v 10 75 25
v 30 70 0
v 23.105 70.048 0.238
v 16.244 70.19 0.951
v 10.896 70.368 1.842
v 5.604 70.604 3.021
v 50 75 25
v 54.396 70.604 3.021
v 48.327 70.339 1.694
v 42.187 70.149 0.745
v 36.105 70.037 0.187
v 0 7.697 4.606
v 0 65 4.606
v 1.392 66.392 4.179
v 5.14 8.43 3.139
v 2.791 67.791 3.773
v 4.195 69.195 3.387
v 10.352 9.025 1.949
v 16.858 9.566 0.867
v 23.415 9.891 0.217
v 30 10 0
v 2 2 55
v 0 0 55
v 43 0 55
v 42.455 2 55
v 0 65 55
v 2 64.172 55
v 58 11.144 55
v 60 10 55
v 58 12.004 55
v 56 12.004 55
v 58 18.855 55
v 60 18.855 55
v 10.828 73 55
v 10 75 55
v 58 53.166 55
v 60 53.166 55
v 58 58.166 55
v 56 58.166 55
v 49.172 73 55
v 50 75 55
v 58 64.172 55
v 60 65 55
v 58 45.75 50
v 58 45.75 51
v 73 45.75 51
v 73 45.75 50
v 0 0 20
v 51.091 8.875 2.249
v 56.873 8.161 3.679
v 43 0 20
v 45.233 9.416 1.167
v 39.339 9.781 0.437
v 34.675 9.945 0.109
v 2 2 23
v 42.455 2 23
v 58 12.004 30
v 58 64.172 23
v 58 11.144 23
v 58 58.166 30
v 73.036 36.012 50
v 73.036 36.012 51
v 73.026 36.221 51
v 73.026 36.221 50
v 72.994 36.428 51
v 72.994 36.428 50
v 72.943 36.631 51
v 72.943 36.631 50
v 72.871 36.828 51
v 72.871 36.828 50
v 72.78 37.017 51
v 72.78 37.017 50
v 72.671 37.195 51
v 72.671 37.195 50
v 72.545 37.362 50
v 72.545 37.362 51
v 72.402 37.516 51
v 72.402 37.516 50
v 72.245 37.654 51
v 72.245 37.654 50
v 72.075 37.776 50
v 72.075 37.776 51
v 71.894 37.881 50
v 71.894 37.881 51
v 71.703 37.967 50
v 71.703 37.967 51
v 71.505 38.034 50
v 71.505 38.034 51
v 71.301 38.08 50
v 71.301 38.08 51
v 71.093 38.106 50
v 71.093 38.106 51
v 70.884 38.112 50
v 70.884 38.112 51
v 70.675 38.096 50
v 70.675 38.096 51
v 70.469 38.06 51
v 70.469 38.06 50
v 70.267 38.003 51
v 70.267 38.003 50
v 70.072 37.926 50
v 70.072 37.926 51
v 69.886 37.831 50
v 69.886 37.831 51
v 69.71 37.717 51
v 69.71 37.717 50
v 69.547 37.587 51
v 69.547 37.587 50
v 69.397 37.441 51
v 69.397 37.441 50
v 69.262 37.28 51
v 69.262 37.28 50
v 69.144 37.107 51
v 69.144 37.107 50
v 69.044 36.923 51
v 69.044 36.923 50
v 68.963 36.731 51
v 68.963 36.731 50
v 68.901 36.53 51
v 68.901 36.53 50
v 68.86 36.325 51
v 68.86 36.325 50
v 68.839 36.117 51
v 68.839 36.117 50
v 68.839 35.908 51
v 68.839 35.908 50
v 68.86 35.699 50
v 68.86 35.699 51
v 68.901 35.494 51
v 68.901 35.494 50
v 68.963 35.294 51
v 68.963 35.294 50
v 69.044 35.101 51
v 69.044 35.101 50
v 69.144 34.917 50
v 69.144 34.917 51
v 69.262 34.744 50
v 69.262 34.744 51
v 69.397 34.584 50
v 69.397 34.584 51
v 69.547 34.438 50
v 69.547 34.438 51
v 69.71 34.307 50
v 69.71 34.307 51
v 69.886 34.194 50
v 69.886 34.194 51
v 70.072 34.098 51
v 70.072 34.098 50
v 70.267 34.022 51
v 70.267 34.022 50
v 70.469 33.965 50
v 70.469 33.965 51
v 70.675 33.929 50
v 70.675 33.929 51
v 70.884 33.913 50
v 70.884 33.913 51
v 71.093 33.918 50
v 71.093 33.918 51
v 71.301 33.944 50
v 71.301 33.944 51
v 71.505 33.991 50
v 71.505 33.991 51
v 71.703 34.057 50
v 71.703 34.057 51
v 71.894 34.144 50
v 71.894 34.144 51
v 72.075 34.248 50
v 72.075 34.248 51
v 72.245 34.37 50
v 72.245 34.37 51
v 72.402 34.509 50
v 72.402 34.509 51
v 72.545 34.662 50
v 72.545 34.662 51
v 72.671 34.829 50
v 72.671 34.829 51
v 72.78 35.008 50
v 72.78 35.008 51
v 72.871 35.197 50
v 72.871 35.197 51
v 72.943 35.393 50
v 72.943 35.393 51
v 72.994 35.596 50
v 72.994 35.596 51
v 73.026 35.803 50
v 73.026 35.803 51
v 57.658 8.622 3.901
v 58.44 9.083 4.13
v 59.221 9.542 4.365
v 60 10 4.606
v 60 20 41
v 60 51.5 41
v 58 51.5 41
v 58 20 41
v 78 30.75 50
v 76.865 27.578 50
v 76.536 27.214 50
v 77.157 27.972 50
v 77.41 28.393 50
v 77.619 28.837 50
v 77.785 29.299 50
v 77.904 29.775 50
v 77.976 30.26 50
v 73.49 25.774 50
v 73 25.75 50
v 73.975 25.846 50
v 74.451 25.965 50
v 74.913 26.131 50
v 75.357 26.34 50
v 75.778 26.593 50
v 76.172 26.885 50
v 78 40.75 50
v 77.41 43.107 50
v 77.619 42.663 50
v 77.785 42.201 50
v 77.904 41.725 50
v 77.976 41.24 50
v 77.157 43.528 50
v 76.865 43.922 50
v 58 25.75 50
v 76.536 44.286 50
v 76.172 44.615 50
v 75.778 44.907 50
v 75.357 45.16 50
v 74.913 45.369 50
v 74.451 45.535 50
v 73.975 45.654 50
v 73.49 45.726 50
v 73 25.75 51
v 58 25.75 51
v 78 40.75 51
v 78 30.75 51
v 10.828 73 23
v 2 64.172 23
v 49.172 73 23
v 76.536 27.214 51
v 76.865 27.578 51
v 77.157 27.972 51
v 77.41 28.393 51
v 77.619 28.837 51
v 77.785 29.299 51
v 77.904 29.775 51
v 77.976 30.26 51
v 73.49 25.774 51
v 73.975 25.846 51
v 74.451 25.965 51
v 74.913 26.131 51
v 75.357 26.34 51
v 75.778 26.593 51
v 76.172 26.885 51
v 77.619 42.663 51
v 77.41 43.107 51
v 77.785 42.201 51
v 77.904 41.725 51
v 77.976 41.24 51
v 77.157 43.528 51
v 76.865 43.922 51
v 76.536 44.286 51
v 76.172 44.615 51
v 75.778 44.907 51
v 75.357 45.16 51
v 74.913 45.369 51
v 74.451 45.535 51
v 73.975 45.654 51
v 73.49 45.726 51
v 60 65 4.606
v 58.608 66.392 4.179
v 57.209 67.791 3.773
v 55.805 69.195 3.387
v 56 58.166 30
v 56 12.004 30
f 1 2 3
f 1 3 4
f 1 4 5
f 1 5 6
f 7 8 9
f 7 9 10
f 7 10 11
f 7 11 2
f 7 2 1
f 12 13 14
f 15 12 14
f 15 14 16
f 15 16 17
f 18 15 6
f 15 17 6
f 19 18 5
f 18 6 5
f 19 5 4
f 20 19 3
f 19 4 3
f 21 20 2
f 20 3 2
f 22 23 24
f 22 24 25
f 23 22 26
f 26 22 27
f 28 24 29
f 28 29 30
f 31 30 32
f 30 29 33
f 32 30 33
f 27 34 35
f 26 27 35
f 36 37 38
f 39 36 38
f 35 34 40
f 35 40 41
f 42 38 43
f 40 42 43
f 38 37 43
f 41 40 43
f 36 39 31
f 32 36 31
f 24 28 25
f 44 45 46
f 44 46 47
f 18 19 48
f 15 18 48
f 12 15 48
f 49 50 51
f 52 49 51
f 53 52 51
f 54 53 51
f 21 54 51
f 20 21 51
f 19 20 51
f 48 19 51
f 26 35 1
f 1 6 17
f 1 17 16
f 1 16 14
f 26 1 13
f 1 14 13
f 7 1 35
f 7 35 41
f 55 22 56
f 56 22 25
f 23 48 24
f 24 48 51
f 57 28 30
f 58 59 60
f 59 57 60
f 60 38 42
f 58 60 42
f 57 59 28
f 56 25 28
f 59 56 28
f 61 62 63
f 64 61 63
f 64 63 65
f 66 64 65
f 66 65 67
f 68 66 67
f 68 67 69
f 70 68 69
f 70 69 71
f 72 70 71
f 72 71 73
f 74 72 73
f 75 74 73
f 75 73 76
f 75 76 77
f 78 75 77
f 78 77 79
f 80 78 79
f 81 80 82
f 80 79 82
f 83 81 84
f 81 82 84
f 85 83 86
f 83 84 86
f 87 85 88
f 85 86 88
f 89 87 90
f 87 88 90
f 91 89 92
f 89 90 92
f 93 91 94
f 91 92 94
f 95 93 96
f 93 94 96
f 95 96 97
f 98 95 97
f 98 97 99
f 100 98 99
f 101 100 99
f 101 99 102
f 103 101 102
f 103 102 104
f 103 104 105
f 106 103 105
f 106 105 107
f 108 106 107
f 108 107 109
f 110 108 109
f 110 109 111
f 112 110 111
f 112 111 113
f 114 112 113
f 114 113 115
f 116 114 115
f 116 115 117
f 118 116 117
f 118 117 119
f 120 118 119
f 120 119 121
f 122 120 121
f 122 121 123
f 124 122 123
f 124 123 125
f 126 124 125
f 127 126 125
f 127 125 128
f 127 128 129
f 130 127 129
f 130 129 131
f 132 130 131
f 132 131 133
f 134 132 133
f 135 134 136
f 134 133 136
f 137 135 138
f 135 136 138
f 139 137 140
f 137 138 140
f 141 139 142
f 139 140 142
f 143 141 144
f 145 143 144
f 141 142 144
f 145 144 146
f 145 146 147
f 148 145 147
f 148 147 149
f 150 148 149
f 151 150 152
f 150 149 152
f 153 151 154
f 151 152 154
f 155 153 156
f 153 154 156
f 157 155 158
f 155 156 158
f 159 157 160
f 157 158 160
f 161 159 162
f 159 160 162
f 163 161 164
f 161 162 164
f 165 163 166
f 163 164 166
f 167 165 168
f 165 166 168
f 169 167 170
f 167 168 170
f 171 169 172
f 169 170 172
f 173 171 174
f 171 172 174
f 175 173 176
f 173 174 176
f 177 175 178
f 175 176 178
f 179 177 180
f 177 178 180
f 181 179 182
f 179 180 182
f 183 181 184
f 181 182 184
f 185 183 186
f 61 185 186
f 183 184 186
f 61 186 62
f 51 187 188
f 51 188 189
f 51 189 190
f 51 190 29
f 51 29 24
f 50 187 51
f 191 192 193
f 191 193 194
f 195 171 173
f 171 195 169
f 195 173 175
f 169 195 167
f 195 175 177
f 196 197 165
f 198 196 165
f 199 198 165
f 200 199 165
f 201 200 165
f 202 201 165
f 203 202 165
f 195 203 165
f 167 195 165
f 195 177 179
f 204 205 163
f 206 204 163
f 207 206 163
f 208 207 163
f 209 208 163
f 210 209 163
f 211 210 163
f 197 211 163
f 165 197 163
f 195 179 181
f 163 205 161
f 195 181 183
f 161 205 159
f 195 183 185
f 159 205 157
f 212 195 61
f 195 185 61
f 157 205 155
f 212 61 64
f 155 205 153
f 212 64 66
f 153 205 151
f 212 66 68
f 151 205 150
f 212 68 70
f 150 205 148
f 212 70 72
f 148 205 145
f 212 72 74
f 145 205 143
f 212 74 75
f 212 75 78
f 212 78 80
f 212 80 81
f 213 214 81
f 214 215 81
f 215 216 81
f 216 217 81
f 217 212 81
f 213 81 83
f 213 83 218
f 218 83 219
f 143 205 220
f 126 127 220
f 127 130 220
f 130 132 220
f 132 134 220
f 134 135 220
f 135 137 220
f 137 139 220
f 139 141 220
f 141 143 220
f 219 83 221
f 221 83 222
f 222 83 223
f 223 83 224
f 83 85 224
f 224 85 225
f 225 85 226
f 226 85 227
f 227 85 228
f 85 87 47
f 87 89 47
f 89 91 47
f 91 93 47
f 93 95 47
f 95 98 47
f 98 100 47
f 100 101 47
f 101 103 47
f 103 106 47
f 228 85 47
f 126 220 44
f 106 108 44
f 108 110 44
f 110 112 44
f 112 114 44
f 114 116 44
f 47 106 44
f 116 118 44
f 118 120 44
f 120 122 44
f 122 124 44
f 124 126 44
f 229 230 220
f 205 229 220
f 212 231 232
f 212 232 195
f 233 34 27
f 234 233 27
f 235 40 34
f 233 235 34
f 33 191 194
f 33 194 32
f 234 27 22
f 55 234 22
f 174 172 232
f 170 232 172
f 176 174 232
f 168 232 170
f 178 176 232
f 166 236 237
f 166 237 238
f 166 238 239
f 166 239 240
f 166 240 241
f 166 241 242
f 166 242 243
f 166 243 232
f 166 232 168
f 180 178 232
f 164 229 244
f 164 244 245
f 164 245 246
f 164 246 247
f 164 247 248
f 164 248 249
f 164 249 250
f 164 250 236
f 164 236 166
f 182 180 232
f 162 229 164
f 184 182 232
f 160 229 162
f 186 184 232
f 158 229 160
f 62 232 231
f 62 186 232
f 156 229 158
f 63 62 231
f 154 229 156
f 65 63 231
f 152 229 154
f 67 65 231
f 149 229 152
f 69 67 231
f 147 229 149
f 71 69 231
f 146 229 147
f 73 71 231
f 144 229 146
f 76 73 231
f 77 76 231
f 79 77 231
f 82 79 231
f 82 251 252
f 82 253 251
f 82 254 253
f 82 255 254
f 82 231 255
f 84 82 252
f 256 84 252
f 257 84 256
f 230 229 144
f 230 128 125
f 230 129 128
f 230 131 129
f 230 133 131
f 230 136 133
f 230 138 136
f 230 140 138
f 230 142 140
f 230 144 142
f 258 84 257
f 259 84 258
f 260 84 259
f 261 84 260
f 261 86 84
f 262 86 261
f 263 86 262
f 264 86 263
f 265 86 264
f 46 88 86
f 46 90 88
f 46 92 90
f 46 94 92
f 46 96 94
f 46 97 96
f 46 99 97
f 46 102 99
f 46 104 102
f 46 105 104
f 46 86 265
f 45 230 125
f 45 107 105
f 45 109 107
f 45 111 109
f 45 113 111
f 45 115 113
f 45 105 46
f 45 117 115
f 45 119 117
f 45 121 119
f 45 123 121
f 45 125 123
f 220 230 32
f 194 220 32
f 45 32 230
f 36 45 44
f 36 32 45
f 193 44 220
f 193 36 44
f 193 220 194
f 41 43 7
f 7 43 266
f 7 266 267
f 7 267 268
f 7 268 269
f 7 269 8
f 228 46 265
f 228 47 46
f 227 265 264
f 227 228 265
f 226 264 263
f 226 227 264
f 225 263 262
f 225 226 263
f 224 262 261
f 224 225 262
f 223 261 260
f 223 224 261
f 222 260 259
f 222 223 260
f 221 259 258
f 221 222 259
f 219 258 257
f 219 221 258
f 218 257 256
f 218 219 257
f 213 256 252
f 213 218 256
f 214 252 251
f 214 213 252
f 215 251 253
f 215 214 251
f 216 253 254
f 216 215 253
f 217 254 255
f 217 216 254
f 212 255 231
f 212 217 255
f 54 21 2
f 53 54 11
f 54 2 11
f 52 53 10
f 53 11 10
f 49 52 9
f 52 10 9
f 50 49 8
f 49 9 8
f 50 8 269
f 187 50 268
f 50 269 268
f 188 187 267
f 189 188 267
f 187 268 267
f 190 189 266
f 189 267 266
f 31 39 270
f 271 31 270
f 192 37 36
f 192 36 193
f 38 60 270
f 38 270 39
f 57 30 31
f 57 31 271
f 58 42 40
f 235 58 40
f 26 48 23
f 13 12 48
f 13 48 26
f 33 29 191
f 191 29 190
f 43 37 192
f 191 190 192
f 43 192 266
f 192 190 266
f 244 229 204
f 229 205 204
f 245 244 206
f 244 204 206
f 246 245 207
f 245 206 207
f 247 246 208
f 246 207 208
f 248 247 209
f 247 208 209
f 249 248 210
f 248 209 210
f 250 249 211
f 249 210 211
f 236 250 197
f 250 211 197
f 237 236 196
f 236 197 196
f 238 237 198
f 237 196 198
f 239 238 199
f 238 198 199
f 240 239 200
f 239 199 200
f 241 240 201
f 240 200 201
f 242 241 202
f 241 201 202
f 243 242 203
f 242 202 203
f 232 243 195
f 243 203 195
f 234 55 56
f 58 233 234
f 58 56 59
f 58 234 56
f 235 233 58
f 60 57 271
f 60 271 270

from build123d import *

# Parameters (mm, degrees)
SKETCH_1_W            = 60
SKETCH_1_H            = 75
EXTRUDE_1_DEPTH       = 55
CUT_EXTRUDE_2_DEPTH   = 63
CUT_EXTRUDE_3_DEPTH   = 63
CUT_EXTRUDE_4_DEPTH   = 63
CUT_EXTRUDE_5_DEPTH   = 73
CUT_EXTRUDE_6_DEPTH   = 32
CUT_EXTRUDE_7_DEPTH   = 32
EXTRUDE_2_DEPTH       = 2
SKETCH_10_W           = 1
SKETCH_10_H           = 20
EXTRUDE_3_DEPTH       = 20
FILLET_1_R            = 5
HOLE_WIZARD_M51_D     = 4.2
HOLE_WIZARD_M51_DEPTH = 38.5
HOLE_WIZARD_M51_TIP   = 1.2618073


with BuildPart() as part:
    # Эскиз1 → Бобышка-Вытянуть1 (new body)
    with BuildSketch(Plane.XY):
        with Locations((30, 37.5)):
            Rectangle(SKETCH_1_W, SKETCH_1_H)
    extrude(amount=EXTRUDE_1_DEPTH)

    # Эскиз3 → Вырез-Вытянуть2 (cut)
    with BuildSketch(Plane(origin=(60, 0, 0), x_dir=(0, 0, -1), z_dir=(1, 0, 0))):
        Polygon((0, 0), (0, 10), (-20, 0), align=None)
        Polygon((0, 75), (0, 70), (-25, 75), align=None)
    extrude(amount=-CUT_EXTRUDE_2_DEPTH, mode=Mode.SUBTRACT)

    # Эскиз4 → Вырез-Вытянуть3 (cut)
    with BuildSketch(Plane(origin=(0, 0, 0), x_dir=(-1, 0, 0), z_dir=(0, 0, -1))):
        Polygon((-60, 0), (-60, 10), (-43, 0), align=None)
    extrude(amount=-CUT_EXTRUDE_3_DEPTH, mode=Mode.SUBTRACT)

    # Эскиз5 → Вырез-Вытянуть4 (cut)
    with BuildSketch(Plane(origin=(0, 0, 0), x_dir=(-1, 0, 0), z_dir=(0, 0, -1))):
        Polygon((-60, 75), (-60, 65), (-50, 75), align=None)
        Polygon((-10, 75), (0, 65), (0, 75), align=None)
    extrude(amount=-CUT_EXTRUDE_4_DEPTH, mode=Mode.SUBTRACT)

    # Эскиз6 → Вырез-Вытянуть5 (cut)
    with BuildSketch(Plane(origin=(0, 75, 0), x_dir=(1, 0, 0), z_dir=(0, 1, 0))):
        with BuildLine():
            Line((30.000000357, 0), (0, 0))
            Line((0, 0), (0, -4.606079858))
            ThreePointArc((0, -4.606079858), (14.824230248, -1.158227391), (30.000000357, 0))
        make_face()
        with BuildLine():
            Line((60, 0), (30.000000357, 0))
            ThreePointArc((30.000000357, 0), (45.175770105, -1.158227445), (60, -4.606079858))
            Line((60, -4.606079858), (60, 0))
        make_face()
    extrude(amount=-CUT_EXTRUDE_5_DEPTH, mode=Mode.SUBTRACT)

    # Эскиз7 → Вырез-Вытянуть6 (cut)
    with BuildSketch(Plane.XY.offset(55)):
        Polygon((58, 64.171572875), (49.171572875, 73), (10.828427125, 73), (2, 64.171572875), (2, 2), (42.455383415, 2), (58, 11.143892109), align=None)
    extrude(amount=-CUT_EXTRUDE_6_DEPTH, mode=Mode.SUBTRACT)

    # Эскиз8 → Вырез-Вытянуть7 (cut)
    with BuildSketch(Plane(origin=(60, 0, 0), x_dir=(0, 0, -1), z_dir=(1, 0, 0))):
        Polygon((-55, 18.854810441), (-55, 53.166098562), (-41, 51.5), (-41, 20), align=None)
    extrude(amount=-CUT_EXTRUDE_7_DEPTH, mode=Mode.SUBTRACT)

    # Эскиз9 → Бобышка-Вытянуть2 (add)
    with BuildSketch(Plane.ZY.offset(-58)):
        Polygon((55, 53.166098562), (55, 18.854810441), (55, 12.004066058), (30, 12.004066058), (30, 58.166098562), (55, 58.166098562), align=None)
    extrude(amount=EXTRUDE_2_DEPTH)

    # Эскиз10 → Бобышка-Вытянуть3 (add)
    with BuildSketch(Plane(origin=(58, 0, 0), x_dir=(0, 0, -1), z_dir=(1, 0, 0))):
        with Locations((-50.5, 35.75)):
            Rectangle(SKETCH_10_W, SKETCH_10_H)
    extrude(amount=EXTRUDE_3_DEPTH)

    # Скругление1
    fillet_1_edges = [part.edges().sort_by_distance(p)[0] for p in [
        (78, 45.75, 50.5),
        (78, 25.75, 50.5),
    ]]
    fillet(fillet_1_edges, radius=FILLET_1_R)

    # Отверстие обработанное метчиком M51
    with Locations(Plane(origin=(0, 0, 50), x_dir=(-1, 0, 0), z_dir=(0, 0, -1))):
        with Locations((-70.936057607, 36.012290947)):
            Hole(HOLE_WIZARD_M51_D / 2, depth=HOLE_WIZARD_M51_DEPTH)
            with Locations((0, 0, -(HOLE_WIZARD_M51_DEPTH + HOLE_WIZARD_M51_TIP / 2))):  # 118° drill point
                Cone(0, HOLE_WIZARD_M51_D / 2, HOLE_WIZARD_M51_TIP, mode=Mode.SUBTRACT)


solid = part.part
